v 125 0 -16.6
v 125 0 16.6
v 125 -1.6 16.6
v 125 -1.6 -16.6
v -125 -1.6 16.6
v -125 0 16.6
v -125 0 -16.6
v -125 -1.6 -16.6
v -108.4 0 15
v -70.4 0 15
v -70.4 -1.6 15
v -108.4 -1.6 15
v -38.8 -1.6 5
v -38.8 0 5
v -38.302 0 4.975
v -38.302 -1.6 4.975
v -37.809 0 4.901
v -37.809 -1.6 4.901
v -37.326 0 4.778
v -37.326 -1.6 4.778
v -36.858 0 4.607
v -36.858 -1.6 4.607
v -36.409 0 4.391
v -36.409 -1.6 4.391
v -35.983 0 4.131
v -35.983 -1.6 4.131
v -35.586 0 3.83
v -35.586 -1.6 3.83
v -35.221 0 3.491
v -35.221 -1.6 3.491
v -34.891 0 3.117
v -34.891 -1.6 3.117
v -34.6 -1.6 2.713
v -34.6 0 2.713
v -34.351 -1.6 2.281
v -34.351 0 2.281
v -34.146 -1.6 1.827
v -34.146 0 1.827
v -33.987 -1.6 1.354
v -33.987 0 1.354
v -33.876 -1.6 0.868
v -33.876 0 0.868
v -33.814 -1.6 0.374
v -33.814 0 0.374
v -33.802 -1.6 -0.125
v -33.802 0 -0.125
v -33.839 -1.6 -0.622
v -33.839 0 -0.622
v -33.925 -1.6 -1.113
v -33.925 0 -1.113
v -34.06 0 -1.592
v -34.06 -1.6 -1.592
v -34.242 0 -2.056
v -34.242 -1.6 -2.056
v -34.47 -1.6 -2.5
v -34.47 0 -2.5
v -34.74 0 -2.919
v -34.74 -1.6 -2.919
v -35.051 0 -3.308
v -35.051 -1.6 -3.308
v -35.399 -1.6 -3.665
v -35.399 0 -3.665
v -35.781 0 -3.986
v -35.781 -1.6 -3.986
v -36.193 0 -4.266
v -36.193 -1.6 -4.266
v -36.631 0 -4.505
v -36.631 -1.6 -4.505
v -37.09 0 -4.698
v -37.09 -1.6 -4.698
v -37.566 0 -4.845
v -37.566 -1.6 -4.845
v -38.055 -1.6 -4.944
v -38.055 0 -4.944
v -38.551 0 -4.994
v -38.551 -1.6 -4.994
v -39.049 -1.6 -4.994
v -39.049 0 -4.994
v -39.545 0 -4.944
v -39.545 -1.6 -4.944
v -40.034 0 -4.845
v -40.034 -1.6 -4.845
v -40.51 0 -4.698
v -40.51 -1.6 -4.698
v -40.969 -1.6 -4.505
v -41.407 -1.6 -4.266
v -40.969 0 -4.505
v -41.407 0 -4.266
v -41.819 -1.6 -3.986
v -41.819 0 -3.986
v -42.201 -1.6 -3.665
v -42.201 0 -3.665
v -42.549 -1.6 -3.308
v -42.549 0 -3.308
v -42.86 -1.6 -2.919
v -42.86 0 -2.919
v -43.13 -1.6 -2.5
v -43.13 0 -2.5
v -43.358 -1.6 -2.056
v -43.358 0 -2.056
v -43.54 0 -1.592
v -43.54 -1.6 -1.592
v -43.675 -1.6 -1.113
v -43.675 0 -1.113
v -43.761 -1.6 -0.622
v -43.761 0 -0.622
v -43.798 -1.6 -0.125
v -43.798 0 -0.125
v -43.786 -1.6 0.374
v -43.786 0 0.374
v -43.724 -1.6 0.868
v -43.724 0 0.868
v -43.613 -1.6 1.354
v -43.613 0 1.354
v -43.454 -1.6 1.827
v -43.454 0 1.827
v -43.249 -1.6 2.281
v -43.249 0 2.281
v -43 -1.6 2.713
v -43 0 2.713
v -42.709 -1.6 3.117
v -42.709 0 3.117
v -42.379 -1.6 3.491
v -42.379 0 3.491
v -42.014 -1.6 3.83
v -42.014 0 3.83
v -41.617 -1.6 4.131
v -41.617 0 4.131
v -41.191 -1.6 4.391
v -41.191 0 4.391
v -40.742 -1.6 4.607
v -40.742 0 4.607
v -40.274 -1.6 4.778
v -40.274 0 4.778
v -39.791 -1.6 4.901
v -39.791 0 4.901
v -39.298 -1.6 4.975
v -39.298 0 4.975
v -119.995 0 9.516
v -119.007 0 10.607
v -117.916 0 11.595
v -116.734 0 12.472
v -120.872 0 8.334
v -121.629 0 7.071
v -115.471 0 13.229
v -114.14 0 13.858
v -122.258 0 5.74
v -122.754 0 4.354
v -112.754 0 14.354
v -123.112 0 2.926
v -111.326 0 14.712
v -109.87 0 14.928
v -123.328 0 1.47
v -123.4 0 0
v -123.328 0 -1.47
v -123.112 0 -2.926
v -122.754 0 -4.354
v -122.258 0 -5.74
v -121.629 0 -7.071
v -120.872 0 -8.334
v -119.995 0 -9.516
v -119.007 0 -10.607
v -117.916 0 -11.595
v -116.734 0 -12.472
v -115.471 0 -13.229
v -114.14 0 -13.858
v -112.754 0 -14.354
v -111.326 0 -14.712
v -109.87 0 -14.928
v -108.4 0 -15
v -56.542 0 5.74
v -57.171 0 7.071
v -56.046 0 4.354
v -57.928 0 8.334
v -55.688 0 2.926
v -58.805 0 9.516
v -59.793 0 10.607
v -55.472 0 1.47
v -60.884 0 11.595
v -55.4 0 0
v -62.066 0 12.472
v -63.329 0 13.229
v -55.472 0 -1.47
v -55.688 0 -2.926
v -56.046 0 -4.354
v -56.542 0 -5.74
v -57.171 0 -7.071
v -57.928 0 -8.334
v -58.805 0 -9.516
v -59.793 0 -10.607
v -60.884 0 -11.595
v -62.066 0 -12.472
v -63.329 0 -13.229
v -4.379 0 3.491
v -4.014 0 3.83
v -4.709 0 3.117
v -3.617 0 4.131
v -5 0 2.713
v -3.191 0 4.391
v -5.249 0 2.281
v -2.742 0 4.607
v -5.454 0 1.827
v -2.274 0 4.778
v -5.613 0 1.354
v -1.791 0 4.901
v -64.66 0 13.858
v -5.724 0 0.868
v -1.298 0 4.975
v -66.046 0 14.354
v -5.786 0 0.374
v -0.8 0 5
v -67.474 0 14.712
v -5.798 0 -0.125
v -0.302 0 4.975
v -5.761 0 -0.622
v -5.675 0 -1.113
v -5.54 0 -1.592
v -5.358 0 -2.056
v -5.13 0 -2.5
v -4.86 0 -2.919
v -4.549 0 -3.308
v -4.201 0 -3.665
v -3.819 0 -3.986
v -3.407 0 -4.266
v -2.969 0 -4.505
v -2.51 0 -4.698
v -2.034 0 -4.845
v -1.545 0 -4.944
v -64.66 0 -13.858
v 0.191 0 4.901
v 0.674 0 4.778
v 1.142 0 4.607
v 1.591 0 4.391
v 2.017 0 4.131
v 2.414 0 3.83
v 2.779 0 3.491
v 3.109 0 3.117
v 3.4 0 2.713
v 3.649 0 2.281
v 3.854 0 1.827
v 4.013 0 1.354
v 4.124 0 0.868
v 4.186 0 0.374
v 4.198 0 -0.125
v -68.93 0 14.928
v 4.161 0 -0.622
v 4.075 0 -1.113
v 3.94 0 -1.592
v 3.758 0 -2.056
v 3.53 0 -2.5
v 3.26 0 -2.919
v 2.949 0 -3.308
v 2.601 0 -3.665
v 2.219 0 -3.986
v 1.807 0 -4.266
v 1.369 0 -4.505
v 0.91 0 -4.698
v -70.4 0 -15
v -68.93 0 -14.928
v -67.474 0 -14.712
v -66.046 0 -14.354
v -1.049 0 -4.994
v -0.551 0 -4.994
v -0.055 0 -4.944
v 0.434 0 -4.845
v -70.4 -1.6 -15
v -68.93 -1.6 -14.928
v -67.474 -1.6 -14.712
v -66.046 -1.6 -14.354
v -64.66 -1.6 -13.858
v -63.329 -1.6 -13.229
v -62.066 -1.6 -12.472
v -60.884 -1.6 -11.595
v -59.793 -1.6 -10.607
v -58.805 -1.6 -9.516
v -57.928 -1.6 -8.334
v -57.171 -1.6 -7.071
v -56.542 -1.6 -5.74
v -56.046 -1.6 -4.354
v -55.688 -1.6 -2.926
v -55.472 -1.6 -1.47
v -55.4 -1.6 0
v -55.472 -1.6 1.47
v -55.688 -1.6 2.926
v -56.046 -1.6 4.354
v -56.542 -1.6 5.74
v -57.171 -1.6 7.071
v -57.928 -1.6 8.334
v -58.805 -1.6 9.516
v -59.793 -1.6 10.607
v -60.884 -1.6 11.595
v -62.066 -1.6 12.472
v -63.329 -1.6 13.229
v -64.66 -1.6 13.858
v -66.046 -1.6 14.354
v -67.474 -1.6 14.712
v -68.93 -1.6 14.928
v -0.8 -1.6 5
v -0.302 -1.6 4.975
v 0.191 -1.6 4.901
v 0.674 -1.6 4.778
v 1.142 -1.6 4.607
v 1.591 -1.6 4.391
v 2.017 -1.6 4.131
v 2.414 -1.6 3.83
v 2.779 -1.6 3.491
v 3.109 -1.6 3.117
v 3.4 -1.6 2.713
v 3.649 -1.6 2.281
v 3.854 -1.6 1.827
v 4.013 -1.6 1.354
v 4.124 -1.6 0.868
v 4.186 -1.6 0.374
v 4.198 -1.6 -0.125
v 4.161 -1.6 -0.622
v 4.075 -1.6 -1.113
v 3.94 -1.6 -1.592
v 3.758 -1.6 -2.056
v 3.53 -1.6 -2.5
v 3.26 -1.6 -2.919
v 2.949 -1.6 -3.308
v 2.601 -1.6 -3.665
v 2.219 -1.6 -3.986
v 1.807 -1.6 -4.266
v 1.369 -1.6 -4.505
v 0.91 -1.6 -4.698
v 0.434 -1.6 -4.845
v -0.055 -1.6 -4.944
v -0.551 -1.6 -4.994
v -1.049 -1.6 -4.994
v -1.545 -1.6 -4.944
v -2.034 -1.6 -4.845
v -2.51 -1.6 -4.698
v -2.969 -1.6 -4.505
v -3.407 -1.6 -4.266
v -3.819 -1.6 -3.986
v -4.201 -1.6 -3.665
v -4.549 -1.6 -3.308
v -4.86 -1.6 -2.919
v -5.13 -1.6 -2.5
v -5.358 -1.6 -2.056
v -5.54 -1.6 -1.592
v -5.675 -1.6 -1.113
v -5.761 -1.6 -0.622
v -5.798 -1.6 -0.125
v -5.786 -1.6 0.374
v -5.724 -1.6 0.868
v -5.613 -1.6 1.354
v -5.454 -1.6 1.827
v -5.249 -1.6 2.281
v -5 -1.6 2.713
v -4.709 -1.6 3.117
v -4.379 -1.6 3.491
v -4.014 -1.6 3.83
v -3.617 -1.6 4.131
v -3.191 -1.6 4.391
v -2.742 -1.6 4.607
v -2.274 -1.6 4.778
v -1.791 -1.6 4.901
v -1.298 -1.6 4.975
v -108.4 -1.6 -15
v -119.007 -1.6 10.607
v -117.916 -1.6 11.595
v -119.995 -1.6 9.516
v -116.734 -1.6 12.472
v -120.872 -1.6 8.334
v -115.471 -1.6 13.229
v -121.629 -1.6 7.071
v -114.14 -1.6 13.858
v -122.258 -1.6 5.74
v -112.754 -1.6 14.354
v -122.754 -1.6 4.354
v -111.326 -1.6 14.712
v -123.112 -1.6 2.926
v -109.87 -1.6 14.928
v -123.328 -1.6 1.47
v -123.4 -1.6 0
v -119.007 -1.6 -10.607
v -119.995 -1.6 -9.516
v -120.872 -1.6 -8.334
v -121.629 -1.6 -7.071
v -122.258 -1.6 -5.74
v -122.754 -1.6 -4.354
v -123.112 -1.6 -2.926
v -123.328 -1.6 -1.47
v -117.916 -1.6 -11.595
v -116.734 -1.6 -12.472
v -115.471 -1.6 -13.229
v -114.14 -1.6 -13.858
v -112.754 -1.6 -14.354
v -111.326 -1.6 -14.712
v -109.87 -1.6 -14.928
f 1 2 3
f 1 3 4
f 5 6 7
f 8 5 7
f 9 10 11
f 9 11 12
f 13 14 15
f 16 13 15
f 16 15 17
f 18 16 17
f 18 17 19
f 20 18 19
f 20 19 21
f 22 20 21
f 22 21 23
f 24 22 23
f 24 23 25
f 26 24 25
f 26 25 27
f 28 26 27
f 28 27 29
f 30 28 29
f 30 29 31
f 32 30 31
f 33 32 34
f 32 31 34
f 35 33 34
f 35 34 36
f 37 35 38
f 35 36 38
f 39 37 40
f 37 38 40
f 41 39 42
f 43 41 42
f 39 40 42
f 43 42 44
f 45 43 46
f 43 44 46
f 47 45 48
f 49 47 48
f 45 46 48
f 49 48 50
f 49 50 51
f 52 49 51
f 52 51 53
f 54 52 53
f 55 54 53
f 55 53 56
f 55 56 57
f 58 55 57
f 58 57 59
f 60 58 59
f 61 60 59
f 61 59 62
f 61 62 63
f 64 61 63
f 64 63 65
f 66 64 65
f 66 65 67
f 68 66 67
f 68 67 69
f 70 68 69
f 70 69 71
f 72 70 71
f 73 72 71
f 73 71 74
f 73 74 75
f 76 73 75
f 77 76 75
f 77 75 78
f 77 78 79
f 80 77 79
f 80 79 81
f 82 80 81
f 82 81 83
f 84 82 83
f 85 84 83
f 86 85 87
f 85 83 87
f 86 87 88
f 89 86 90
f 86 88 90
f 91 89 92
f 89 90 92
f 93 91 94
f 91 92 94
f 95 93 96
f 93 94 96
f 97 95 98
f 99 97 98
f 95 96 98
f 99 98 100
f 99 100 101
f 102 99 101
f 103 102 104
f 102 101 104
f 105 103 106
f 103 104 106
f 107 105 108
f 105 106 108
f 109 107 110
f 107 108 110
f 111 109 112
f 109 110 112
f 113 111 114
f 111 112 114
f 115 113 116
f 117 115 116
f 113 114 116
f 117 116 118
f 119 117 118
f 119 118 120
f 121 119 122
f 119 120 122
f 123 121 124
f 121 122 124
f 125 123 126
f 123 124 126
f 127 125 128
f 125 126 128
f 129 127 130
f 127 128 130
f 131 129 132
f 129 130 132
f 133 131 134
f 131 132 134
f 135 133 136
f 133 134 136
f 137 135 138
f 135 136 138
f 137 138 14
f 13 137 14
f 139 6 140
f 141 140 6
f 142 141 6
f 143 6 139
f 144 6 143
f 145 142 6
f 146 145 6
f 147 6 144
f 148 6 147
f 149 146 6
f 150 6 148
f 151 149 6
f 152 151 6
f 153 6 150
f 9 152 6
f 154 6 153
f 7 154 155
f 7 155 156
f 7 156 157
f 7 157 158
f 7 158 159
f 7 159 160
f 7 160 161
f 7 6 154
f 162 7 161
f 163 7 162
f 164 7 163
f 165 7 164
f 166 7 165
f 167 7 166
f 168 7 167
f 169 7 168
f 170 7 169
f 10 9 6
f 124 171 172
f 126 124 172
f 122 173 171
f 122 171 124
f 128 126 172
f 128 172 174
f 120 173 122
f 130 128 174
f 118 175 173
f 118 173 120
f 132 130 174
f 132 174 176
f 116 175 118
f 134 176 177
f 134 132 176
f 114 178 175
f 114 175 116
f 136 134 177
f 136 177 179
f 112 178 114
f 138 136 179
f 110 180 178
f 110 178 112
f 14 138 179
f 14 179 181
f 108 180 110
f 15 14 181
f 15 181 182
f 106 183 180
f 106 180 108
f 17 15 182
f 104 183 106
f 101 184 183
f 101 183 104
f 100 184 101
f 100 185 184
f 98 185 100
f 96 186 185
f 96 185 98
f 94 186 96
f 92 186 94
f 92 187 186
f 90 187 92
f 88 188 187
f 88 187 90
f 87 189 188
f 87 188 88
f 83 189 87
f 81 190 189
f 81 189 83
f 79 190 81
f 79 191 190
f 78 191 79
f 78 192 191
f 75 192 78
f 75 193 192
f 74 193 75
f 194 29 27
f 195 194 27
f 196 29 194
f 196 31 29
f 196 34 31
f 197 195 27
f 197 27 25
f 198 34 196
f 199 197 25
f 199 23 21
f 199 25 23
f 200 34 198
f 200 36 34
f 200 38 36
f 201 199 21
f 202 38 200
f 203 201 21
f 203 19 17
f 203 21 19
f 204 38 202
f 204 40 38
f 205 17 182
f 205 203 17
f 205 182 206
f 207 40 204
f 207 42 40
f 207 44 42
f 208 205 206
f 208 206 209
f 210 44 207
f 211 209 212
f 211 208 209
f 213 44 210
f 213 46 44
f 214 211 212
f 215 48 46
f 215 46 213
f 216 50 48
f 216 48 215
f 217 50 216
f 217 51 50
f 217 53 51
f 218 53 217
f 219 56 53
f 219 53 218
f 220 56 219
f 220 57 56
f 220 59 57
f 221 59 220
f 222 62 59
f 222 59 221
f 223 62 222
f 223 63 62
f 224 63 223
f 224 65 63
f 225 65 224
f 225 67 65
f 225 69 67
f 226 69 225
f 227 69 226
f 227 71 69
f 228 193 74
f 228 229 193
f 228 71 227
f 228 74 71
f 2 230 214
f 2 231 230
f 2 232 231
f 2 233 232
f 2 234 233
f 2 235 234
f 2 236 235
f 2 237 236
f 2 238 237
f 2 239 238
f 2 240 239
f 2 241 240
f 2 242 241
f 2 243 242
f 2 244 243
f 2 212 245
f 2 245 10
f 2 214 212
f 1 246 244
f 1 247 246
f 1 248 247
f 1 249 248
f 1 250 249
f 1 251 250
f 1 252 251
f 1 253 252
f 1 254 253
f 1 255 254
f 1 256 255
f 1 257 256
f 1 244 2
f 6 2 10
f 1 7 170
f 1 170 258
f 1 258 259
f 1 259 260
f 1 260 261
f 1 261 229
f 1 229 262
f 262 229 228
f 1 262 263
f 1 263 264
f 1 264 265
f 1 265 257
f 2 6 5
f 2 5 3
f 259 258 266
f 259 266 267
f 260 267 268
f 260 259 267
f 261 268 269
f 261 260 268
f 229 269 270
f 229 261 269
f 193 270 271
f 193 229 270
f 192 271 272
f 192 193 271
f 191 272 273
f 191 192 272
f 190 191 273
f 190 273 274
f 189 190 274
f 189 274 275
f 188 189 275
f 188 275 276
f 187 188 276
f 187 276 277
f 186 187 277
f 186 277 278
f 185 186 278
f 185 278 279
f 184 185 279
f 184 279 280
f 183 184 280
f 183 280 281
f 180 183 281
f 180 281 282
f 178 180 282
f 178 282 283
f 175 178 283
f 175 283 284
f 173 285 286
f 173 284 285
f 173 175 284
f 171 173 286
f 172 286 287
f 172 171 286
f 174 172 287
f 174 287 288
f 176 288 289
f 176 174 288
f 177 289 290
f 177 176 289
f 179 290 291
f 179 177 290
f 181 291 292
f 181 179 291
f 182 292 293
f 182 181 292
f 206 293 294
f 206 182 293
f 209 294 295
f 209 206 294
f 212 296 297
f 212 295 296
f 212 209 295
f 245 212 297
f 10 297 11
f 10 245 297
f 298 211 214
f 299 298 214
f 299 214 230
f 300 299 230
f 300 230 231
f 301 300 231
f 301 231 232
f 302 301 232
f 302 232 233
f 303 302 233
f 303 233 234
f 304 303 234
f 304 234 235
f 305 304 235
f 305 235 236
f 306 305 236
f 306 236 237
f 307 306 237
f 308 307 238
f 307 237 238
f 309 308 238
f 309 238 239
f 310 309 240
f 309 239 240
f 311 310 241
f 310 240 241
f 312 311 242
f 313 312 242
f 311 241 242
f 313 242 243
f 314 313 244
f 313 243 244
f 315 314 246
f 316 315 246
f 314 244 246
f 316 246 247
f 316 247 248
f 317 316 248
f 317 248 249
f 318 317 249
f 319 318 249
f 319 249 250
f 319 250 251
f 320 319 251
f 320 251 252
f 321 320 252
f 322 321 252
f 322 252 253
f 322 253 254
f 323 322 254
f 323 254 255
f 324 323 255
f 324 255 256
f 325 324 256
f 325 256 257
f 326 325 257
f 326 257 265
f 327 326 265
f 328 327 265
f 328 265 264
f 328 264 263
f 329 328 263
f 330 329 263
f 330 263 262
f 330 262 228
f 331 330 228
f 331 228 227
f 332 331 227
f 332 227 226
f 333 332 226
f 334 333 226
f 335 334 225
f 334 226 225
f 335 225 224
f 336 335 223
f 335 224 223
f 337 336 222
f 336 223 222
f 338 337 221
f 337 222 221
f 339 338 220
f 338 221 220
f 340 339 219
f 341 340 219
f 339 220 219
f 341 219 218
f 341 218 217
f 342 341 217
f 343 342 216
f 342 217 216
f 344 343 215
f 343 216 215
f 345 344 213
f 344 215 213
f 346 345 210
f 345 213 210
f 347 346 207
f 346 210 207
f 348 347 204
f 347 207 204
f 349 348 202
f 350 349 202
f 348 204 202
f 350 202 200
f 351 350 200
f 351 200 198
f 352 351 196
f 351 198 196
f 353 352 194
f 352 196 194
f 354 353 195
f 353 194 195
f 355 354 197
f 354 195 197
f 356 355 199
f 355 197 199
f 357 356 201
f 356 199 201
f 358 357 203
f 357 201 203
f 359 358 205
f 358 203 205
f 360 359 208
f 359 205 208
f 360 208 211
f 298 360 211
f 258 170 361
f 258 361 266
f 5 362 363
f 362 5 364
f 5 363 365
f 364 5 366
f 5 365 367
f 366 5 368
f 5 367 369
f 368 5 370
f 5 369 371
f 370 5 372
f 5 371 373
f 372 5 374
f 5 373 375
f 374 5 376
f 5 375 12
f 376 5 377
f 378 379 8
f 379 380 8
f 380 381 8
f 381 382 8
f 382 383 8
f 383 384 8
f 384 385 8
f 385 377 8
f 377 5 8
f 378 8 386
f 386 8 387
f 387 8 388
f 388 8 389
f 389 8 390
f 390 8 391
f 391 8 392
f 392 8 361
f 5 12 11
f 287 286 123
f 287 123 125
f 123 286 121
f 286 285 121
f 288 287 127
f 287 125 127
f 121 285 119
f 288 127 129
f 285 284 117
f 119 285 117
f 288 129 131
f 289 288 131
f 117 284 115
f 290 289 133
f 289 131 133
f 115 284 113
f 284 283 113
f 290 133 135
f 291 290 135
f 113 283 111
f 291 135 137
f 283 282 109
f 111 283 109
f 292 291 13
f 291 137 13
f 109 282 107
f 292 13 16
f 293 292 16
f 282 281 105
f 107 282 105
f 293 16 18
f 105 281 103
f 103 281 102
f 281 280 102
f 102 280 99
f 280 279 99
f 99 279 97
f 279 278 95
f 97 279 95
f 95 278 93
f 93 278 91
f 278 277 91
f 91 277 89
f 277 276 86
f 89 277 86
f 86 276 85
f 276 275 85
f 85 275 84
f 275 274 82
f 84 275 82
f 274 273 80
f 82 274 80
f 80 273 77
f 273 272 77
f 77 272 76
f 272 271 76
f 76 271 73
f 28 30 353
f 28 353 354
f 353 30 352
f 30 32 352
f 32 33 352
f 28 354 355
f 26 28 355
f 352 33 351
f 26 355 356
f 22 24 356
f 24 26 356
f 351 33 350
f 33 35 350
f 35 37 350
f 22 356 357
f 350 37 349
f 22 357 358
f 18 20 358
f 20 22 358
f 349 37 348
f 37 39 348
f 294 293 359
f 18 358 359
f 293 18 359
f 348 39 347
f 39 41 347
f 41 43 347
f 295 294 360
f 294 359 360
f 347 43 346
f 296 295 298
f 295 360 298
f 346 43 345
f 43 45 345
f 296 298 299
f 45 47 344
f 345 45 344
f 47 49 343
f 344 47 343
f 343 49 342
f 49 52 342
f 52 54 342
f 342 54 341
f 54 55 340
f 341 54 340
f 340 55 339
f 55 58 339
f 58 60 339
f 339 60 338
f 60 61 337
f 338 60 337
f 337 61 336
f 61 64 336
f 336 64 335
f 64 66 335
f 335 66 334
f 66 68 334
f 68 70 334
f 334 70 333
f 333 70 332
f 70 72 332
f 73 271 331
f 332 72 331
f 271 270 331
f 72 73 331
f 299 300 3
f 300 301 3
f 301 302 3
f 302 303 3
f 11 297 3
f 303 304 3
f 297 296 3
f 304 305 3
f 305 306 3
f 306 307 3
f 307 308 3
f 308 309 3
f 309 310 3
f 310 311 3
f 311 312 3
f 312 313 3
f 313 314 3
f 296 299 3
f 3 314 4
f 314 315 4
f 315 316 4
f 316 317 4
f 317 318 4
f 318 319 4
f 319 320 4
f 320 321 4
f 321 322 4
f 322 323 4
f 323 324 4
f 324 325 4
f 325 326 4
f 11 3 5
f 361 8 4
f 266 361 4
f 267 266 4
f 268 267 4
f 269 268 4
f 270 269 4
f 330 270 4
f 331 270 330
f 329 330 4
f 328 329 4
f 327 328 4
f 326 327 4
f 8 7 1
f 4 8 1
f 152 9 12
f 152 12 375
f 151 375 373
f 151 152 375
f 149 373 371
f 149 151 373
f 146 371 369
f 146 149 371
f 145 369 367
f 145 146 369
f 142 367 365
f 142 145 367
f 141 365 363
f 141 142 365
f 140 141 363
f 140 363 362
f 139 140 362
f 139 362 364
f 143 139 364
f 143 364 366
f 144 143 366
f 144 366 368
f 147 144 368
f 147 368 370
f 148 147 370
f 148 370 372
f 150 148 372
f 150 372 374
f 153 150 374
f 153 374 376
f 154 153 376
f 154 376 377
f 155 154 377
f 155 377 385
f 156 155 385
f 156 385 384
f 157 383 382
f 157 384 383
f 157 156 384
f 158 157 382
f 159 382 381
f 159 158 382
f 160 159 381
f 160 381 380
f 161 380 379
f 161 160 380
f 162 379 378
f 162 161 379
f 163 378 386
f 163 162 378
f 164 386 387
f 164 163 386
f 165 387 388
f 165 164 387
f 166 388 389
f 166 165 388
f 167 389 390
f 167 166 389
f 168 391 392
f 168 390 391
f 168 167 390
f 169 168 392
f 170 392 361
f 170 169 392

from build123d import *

# Parameters (mm, degrees)
SKETCH1_W           = 250
SKETCH1_H           = 33.2
BOSS_EXTRUDE1_DEPTH = 1.6
SKETCH2_R           = 5
CUT_EXTRUDE1_DEPTH  = 127.107573127


with BuildPart() as part:
    # Sketch1 → Boss-Extrude1 (new body)
    with BuildSketch(Plane(origin=(0, 0, 0), x_dir=(1, 0, 0), z_dir=(0, 1, 0))):
        Rectangle(SKETCH1_W, SKETCH1_H)
    extrude(amount=-BOSS_EXTRUDE1_DEPTH)

    # Sketch2 → Cut-Extrude1 (cut, through all)
    with BuildSketch(Plane(origin=(0, 0, 0), x_dir=(1, 0, 0), z_dir=(0, 1, 0))):
        with Locations(Location((-38.8, 0, 0), (0, 0, 270))):
            Circle(SKETCH2_R)
        with Locations(Location((-0.8, 0, 0), (0, 0, 270))):
            Circle(SKETCH2_R)
        with BuildLine():
            Line((-108.4, 15), (-70.4, 15))
            ThreePointArc((-70.4, 15), (-55.4, 0), (-70.4, -15))
            Line((-70.4, -15), (-108.4, -15))
            ThreePointArc((-108.4, -15), (-123.4, 0), (-108.4, 15))
        make_face()
    extrude(amount=-CUT_EXTRUDE1_DEPTH, mode=Mode.SUBTRACT)


solid = part.part
